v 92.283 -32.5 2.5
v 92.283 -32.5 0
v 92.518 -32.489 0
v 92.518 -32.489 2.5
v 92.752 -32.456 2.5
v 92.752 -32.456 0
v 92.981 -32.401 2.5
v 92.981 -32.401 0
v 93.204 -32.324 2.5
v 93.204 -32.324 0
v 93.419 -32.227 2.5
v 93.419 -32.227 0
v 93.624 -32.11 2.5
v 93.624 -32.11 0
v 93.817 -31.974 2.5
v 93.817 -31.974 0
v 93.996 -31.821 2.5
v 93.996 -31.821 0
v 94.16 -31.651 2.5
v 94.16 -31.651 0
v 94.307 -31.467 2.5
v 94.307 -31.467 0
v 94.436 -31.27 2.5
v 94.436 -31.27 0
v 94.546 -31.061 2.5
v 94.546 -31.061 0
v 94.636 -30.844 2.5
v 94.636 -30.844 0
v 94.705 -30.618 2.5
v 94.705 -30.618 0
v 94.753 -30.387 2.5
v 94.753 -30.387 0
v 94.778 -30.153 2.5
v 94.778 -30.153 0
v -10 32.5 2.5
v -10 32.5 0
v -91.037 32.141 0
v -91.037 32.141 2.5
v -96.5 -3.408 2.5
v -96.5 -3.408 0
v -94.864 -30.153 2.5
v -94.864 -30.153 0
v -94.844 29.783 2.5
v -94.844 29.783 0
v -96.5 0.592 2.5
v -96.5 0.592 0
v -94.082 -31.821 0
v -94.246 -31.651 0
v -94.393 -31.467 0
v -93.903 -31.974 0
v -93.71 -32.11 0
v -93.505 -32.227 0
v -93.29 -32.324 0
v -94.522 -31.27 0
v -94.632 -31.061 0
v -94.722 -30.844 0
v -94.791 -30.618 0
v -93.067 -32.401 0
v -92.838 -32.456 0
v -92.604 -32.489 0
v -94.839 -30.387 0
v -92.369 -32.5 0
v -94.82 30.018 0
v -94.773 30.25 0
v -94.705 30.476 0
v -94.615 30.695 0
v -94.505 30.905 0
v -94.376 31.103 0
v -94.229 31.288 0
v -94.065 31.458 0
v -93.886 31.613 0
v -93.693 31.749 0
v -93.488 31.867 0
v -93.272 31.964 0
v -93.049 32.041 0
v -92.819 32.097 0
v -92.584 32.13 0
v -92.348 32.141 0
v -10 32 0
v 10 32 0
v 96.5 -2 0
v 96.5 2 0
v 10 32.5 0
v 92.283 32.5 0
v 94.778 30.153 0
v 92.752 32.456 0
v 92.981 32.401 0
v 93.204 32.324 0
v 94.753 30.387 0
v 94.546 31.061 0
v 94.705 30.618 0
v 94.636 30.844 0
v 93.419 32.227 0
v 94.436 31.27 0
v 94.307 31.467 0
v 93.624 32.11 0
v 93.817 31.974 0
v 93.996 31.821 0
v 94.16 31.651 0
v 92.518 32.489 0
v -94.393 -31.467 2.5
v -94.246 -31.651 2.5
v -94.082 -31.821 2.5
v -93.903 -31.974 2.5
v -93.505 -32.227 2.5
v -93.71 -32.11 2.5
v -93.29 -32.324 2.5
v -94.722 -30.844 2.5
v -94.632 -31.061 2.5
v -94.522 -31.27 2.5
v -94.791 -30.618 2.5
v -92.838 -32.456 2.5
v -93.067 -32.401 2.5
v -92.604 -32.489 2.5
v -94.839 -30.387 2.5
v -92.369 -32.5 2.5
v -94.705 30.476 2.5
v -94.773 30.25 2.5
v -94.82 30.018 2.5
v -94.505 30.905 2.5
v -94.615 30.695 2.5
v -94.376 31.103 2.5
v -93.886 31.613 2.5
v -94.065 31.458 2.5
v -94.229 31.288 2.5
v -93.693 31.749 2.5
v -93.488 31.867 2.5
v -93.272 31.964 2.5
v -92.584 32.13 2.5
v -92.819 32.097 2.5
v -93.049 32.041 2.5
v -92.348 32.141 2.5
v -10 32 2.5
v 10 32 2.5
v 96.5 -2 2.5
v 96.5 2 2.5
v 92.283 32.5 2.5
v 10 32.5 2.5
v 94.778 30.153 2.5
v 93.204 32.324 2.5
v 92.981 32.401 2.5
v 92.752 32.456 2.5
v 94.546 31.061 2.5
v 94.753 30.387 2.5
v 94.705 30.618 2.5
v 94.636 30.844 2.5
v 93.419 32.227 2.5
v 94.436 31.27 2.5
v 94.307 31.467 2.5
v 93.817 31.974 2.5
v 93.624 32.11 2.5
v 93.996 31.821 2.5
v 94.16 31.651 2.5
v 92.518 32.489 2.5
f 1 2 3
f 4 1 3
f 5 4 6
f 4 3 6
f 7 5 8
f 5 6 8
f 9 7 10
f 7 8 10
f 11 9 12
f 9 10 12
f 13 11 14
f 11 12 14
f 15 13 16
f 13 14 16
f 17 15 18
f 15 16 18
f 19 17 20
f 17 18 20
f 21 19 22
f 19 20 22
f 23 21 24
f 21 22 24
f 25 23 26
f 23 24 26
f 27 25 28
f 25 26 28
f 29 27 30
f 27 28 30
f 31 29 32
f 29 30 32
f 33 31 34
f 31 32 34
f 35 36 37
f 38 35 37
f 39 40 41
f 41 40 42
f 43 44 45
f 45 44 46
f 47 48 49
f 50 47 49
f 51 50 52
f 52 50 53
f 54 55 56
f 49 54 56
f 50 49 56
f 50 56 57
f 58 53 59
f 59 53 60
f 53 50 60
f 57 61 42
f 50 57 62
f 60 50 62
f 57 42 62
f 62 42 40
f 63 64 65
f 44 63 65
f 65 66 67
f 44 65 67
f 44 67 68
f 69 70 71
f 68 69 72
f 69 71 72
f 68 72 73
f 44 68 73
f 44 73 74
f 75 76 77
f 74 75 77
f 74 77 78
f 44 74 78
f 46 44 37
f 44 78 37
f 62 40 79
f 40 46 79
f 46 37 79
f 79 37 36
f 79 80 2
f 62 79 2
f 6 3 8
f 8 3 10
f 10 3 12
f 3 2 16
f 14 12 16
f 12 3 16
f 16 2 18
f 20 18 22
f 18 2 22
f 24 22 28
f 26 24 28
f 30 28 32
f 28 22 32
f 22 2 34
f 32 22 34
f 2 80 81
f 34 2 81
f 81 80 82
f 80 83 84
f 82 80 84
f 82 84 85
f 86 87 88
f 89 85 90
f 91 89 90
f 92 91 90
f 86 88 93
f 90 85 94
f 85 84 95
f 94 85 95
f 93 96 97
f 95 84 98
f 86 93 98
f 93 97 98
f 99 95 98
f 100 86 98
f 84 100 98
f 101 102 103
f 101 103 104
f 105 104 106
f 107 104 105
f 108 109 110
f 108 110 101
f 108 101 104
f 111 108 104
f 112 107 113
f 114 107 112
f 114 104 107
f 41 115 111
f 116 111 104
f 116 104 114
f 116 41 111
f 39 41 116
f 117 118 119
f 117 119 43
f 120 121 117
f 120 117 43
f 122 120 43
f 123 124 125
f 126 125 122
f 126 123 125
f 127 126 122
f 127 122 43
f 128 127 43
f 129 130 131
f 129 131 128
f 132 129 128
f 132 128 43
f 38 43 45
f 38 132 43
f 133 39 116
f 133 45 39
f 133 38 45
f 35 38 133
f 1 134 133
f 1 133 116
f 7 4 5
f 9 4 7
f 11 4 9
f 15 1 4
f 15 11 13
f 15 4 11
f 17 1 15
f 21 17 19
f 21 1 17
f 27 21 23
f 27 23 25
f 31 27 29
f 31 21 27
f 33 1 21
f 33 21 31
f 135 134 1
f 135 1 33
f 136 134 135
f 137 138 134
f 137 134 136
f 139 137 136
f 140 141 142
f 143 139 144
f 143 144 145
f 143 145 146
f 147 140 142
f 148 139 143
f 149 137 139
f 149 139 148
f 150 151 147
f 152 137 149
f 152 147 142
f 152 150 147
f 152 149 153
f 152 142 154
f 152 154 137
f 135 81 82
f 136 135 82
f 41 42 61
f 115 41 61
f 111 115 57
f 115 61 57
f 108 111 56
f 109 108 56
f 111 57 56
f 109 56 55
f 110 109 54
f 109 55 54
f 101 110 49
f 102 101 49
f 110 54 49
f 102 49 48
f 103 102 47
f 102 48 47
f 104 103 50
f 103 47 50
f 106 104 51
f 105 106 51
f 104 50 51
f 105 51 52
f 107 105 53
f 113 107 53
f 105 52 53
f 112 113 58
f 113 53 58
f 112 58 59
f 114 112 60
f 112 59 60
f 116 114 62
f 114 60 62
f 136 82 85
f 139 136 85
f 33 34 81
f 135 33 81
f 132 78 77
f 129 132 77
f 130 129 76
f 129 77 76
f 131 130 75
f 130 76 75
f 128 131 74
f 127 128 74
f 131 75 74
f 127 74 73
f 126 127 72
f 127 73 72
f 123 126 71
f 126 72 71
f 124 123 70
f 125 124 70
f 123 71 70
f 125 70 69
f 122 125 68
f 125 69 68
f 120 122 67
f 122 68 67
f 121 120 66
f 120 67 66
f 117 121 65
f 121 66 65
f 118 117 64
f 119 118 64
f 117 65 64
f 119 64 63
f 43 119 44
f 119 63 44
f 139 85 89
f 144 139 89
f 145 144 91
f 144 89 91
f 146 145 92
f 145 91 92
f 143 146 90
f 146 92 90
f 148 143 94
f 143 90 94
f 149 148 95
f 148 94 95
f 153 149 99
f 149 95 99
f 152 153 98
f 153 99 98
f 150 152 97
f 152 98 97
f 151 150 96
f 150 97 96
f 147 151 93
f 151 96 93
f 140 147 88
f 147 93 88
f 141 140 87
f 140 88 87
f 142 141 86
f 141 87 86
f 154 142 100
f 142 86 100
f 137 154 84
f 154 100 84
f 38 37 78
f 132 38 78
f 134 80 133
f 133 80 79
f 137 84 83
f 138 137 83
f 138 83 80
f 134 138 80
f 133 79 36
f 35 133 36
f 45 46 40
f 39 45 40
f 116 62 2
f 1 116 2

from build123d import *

# Parameters (mm, degrees)
F1_DEPTH = 2.5


with BuildPart() as f1:
    # F0 (on Top) → F1 (new body)
    with BuildSketch(Plane.XY):
        with BuildLine():
            Line((10, 32), (0, 32))
            Line((0, 32), (-10, 32))
            Line((-10, 32), (-10, 32.5))
            Line((-10, 32.5), (-91.037364, 32.141307))
            Line((-91.037364, 32.141307), (-92.348252, 32.141307))
            ThreePointArc((-92.348252, 32.141307), (-94.065235, 31.458439), (-94.84424, 29.782882))
            Line((-94.84424, 29.782882), (-96.5, 0.591573))
            Line((-96.5, 0.591573), (-96.5, -1.408427))
            Line((-96.5, -1.408427), (-96.5, -3.408427))
            Line((-96.5, -3.408427), (-94.864255, -30.152621))
            ThreePointArc((-94.864255, -30.152621), (-94.081875, -31.820927), (-92.368918, -32.5))
            Line((-92.368918, -32.5), (0, -32.5))
            Line((0, -32.5), (92.282775, -32.5))
            ThreePointArc((92.282775, -32.5), (93.995732, -31.820927), (94.778112, -30.152621))
            Line((94.778112, -30.152621), (96.5, -2))
            Line((96.5, -2), (96.5, 0))
            Line((96.5, 0), (96.5, 2))
            Line((96.5, 2), (94.778112, 30.152621))
            ThreePointArc((94.778112, 30.152621), (93.995732, 31.820927), (92.282775, 32.5))
            Line((92.282775, 32.5), (10, 32.5))
            Line((10, 32.5), (10, 32))
        make_face()
    extrude(amount=F1_DEPTH)


solid = f1.part
